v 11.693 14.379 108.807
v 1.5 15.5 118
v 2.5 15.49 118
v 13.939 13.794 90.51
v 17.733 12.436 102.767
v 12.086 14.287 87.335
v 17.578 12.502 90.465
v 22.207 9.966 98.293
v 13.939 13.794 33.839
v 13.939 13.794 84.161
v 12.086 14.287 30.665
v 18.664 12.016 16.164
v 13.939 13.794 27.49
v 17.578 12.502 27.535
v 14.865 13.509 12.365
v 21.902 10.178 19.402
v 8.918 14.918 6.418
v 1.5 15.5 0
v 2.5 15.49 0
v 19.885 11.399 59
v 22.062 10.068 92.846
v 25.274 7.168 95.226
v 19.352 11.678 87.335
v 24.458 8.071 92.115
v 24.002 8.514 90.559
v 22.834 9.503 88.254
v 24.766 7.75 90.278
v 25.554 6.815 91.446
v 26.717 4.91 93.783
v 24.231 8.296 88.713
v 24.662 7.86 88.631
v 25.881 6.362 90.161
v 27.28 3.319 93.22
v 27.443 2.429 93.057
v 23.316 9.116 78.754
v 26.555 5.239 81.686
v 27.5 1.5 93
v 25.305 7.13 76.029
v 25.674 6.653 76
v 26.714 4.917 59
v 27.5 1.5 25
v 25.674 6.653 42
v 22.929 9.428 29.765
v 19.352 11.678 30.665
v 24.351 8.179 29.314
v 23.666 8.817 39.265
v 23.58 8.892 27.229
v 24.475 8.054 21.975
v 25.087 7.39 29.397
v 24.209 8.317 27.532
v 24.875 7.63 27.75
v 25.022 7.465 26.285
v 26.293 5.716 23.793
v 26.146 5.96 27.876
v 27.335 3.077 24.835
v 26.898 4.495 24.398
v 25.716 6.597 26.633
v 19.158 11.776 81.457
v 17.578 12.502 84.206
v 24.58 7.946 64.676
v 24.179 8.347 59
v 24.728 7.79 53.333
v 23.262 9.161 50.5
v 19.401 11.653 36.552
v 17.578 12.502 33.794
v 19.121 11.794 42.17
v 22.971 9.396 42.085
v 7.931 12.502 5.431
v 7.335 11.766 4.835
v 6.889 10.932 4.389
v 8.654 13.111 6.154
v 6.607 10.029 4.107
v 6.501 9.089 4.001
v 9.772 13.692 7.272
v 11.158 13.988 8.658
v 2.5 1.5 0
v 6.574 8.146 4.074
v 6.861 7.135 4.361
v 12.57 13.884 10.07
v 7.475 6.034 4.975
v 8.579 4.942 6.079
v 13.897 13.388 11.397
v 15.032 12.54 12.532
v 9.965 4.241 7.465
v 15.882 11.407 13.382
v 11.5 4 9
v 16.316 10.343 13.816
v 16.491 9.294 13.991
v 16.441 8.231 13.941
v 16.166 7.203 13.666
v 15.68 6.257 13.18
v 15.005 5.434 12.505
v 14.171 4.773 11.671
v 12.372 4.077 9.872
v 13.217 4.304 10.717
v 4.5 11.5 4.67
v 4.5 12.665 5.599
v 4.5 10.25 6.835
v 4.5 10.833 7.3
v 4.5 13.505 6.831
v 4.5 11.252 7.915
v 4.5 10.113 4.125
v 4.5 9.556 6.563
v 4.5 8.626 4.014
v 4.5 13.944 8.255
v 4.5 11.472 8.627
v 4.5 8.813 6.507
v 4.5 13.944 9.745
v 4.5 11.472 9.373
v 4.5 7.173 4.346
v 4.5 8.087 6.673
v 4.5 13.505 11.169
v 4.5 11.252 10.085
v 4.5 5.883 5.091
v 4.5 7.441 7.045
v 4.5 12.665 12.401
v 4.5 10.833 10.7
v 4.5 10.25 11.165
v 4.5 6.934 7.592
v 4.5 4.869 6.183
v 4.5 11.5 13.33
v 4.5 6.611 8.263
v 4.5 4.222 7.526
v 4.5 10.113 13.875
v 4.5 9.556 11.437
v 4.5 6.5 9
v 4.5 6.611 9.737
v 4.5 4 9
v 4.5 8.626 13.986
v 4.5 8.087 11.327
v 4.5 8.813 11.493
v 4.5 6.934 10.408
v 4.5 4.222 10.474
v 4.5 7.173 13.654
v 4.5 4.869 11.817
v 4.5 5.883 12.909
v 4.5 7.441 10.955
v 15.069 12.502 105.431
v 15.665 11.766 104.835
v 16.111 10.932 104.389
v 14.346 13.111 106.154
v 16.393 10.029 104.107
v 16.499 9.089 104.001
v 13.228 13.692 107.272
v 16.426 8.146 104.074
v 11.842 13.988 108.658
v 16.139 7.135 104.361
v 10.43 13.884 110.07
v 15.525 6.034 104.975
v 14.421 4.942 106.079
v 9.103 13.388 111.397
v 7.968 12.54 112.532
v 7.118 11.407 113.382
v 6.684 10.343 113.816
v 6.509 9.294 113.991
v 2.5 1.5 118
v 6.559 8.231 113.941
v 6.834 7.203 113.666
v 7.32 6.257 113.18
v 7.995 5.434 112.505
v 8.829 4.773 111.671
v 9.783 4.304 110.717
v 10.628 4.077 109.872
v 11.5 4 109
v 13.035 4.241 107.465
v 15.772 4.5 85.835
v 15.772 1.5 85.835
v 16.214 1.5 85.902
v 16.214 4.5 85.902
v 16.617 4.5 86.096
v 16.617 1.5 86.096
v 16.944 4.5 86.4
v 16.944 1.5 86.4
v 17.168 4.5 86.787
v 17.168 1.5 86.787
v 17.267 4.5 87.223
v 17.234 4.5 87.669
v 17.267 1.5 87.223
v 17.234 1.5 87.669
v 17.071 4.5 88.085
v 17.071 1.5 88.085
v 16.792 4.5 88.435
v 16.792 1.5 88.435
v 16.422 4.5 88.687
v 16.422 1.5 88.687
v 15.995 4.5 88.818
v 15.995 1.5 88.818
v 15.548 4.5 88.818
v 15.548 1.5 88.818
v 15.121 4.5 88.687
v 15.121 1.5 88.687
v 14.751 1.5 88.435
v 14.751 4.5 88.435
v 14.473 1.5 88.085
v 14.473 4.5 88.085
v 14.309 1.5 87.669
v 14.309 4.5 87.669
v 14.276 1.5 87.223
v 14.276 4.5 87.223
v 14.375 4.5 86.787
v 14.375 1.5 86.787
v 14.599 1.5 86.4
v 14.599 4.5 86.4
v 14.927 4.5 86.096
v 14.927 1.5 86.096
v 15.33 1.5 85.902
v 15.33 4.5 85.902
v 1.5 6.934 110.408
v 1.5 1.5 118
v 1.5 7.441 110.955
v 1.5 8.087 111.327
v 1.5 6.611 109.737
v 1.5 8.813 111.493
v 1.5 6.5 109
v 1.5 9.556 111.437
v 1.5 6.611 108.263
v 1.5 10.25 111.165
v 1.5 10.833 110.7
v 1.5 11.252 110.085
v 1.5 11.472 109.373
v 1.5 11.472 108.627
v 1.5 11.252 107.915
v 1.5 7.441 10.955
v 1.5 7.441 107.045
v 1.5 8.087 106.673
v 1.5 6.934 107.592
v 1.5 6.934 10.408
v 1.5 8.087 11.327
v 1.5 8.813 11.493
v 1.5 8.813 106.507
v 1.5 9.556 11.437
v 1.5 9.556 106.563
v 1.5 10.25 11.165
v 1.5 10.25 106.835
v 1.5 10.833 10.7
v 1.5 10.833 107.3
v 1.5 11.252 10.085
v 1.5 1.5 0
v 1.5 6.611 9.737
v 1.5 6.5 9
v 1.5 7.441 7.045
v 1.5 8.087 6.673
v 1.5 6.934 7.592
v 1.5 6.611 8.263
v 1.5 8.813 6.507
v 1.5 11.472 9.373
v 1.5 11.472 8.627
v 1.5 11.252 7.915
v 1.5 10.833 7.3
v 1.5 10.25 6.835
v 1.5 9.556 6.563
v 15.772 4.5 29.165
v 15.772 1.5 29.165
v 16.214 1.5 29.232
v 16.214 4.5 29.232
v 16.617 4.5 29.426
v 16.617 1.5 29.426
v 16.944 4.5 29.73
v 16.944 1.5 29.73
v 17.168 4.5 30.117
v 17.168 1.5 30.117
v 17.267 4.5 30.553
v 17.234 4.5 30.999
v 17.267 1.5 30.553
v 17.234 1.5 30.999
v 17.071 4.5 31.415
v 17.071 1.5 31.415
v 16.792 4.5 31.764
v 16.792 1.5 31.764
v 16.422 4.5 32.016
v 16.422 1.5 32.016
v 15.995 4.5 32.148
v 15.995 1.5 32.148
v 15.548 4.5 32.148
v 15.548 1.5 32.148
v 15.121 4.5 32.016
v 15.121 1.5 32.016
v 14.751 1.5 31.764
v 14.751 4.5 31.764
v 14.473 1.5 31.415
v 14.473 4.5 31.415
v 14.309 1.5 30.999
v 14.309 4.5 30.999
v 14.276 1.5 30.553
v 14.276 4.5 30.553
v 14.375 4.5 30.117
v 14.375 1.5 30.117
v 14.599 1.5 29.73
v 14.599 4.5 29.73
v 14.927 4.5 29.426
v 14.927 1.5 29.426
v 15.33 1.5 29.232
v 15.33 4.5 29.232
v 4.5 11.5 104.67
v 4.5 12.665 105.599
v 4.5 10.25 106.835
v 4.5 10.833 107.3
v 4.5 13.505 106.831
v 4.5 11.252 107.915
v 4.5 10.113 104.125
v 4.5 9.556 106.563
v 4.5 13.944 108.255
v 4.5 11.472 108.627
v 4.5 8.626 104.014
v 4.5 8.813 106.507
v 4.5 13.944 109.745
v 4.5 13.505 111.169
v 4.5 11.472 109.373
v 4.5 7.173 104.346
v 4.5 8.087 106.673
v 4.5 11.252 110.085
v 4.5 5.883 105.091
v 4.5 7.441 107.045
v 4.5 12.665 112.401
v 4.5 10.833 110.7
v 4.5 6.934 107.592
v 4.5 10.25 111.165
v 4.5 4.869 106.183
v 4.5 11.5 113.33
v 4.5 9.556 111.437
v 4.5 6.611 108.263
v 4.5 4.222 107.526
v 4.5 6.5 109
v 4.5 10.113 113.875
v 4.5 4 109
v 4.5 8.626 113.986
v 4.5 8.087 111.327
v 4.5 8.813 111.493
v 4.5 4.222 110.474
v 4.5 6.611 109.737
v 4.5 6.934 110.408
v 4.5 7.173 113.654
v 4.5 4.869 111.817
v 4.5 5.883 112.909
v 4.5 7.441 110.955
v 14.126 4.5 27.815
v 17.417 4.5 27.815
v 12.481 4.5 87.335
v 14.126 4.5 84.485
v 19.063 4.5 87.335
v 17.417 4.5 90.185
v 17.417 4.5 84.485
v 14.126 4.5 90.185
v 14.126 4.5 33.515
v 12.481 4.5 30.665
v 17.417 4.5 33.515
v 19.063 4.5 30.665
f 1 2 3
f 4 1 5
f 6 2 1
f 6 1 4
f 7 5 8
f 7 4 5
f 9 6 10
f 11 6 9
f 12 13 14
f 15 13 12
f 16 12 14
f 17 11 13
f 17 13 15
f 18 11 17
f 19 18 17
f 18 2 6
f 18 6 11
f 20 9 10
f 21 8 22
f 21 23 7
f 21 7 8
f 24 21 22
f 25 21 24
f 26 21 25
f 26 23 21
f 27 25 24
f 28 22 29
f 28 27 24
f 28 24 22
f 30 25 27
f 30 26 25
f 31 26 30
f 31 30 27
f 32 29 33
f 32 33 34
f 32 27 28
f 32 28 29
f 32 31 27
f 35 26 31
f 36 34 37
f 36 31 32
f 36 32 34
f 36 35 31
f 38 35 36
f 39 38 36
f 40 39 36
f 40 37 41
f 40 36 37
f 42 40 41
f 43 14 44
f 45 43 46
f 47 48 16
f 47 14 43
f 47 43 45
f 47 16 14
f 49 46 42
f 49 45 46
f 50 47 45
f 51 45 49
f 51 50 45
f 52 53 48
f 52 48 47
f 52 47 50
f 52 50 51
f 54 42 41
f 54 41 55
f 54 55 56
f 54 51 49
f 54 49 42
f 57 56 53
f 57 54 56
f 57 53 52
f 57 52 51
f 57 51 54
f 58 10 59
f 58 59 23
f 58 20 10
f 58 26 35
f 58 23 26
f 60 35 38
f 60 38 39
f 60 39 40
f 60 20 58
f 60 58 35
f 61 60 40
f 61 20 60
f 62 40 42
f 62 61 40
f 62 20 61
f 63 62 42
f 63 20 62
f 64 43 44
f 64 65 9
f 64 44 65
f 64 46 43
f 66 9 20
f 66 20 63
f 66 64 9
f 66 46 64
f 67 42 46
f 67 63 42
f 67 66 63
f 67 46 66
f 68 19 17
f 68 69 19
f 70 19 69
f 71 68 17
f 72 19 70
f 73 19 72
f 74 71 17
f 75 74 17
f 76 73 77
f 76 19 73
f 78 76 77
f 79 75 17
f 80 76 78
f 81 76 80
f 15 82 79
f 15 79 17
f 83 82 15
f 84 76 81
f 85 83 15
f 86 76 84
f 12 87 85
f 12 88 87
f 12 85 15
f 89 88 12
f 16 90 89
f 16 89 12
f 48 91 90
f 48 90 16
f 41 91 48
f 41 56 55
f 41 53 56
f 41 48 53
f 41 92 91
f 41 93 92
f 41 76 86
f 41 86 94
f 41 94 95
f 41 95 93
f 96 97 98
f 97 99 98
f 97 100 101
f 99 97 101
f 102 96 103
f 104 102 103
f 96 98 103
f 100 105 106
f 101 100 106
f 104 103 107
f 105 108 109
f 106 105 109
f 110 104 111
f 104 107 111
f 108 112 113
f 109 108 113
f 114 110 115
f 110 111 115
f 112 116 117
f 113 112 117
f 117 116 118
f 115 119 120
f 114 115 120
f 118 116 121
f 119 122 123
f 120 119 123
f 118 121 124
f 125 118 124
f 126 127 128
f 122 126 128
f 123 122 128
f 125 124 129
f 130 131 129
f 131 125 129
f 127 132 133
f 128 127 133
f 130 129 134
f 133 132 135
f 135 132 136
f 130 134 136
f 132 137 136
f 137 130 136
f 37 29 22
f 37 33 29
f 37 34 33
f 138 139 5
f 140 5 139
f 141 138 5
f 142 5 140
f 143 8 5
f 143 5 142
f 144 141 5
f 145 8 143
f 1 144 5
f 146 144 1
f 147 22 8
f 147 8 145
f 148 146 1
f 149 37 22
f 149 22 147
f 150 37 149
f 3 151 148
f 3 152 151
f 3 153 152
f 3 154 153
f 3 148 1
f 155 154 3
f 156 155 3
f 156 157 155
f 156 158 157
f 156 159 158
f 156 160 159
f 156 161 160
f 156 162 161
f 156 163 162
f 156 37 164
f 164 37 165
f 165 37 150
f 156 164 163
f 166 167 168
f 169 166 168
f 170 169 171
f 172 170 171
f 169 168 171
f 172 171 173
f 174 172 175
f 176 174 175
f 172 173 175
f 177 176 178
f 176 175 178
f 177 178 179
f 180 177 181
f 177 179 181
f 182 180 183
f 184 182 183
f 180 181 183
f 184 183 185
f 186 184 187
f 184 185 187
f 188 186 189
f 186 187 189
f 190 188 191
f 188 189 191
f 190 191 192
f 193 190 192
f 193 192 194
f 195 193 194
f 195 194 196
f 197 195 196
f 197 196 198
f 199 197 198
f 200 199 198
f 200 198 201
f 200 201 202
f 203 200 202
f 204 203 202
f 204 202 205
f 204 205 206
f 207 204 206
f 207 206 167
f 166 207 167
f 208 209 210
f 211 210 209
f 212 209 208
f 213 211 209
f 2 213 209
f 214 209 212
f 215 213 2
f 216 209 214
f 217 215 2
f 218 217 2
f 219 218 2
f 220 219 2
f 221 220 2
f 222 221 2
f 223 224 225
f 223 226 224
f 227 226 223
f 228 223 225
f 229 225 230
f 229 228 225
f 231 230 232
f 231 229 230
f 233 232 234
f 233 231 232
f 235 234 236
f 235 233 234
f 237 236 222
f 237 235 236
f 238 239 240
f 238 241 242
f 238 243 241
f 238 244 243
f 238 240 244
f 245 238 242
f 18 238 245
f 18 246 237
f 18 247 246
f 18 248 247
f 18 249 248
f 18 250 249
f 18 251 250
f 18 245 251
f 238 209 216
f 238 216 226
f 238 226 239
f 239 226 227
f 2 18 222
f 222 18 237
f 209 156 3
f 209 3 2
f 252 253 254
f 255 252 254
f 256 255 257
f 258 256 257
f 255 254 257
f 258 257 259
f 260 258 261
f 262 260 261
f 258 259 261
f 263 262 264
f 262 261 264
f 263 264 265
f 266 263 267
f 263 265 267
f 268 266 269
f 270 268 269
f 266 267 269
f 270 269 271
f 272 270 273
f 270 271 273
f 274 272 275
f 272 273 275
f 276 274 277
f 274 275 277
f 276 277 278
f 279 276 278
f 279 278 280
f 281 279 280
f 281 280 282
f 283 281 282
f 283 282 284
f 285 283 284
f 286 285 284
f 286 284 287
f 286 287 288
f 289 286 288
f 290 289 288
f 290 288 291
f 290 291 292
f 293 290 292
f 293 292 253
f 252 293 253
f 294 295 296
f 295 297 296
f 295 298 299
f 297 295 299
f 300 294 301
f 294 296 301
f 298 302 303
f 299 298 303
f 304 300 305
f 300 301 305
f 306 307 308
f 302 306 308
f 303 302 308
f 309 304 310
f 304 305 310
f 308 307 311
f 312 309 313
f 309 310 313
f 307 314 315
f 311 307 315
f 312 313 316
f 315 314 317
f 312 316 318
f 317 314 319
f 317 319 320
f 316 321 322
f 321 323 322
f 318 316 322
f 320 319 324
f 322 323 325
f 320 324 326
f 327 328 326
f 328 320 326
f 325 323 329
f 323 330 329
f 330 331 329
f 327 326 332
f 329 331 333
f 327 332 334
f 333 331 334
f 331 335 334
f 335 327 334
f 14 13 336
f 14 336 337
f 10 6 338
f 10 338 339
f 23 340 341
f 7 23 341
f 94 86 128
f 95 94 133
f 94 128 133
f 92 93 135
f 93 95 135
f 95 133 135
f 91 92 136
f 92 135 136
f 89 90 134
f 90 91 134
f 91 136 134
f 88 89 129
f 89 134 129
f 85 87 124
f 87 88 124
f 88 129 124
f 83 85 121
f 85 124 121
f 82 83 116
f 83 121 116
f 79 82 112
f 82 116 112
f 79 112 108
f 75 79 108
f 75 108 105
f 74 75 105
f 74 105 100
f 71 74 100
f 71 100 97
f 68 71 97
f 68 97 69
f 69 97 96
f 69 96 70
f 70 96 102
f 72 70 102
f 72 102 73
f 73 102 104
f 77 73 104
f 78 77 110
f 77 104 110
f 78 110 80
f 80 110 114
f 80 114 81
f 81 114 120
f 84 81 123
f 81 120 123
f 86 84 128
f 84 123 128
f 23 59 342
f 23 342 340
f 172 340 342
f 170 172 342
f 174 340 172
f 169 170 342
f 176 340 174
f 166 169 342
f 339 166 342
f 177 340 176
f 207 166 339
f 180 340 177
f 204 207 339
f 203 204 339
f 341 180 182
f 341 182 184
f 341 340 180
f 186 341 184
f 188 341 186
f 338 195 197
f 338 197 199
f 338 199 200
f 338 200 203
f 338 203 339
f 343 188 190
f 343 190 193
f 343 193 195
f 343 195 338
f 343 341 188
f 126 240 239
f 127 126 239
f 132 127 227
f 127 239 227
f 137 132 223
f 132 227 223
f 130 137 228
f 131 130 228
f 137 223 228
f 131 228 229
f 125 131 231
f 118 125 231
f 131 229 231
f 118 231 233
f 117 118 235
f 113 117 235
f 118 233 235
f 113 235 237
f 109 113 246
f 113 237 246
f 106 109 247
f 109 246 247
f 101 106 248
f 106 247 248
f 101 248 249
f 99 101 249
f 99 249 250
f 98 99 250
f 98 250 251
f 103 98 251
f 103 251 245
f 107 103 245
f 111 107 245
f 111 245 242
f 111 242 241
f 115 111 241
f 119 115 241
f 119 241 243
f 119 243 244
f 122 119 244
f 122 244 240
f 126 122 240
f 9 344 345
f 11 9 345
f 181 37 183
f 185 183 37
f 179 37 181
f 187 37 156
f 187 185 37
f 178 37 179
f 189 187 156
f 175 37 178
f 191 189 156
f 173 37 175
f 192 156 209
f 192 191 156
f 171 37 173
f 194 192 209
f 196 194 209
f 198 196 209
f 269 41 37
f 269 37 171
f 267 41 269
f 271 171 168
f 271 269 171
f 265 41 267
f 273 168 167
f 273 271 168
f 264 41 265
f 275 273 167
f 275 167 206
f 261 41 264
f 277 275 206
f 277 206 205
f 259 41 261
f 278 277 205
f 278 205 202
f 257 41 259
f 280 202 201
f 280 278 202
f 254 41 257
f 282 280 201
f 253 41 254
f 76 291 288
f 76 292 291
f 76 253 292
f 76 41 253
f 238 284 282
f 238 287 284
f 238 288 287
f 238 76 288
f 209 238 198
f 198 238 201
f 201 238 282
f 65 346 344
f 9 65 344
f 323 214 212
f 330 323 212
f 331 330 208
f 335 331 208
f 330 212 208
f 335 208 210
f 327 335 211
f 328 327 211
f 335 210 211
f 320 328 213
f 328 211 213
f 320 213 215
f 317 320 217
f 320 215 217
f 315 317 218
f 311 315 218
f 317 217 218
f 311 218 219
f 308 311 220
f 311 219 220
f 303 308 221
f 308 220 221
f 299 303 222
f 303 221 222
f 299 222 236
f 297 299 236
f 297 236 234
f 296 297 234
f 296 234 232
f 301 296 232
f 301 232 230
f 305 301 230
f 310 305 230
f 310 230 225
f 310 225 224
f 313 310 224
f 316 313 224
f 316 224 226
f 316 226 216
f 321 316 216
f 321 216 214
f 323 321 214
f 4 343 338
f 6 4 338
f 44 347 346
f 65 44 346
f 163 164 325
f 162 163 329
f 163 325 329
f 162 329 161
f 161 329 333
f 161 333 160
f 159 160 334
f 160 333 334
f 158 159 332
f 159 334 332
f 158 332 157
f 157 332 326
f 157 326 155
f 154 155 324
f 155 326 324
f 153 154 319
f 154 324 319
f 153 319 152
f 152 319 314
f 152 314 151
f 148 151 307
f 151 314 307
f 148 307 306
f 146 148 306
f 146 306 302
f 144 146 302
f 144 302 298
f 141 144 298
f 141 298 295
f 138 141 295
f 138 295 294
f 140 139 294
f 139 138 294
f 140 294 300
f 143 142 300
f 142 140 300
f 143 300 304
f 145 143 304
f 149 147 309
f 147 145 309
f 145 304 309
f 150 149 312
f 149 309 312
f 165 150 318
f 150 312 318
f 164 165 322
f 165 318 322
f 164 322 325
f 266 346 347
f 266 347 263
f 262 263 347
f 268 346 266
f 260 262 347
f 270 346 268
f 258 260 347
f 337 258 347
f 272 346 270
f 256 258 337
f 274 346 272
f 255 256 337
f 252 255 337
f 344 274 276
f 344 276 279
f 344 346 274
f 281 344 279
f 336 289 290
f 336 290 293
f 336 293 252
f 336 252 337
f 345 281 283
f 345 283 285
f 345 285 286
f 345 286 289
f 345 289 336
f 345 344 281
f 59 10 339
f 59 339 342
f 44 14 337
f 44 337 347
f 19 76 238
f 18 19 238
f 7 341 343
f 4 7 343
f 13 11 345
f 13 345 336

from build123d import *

# Parameters (mm, degrees)
EXTRU_MINCE1_DEPTH      = 118
ESQUISSE2_R             = 2.5
ENL_V_MAT_EXTRU_1_DEPTH = 4
ESQUISSE3_R             = 1.5
ENL_V_MAT_EXTRU_2_DEPTH = 4
CHANFREIN1_SIZE         = 25
BOSS_EXTRU_1_DEPTH      = 118
ESQUISSE5_R             = 2.5
ENL_V_MAT_EXTRU_3_DEPTH = 122.820564897
ESQUISSE6_R             = 1.5
ENL_V_MAT_EXTRU_4_DEPTH = 123.149498698
ENL_V_START             = -3
ESQUISSE8_R             = 5
ENL_V_MAT_EXTRU_5_DEPTH = 119.820564897
ENL_V_MAT_EXTRU_6_DEPTH = 119.9682337
ENL_V_MAT_EXTRU_6_TAPER = -2


with BuildPart() as part:
    # Esquisse1 → Extru.-Mince1 (new body)
    with BuildSketch(Plane.XY):
        Polygon((0, 15.5), (0, 0), (27.5, 0), (27.5, 1.5), (1.5, 1.5), (1.5, 15.5), align=None)
    extrude(amount=EXTRU_MINCE1_DEPTH)

    # Esquisse2 → Enlèv. mat.-Extru.1 (cut)
    with BuildSketch(Plane.ZY):
        with Locations(Location((9, 9, 0), (0, 0, 270))):
            Circle(ESQUISSE2_R)
        with Locations(Location((109, 9, 0), (0, 0, 90))):
            Circle(ESQUISSE2_R)
    extrude(amount=-ENL_V_MAT_EXTRU_1_DEPTH, mode=Mode.SUBTRACT)

    # Esquisse3 → Enlèv. mat.-Extru.2 (cut)
    with BuildSketch(Plane.XZ):
        with Locations(Location((15.771636742, 30.664864187, 0), (0, 0, 270))):
            Circle(ESQUISSE3_R)
        with Locations(Location((15.771636742, 87.335135813, 0), (0, 0, 90))):
            Circle(ESQUISSE3_R)
    extrude(amount=-ENL_V_MAT_EXTRU_2_DEPTH, mode=Mode.SUBTRACT)

    # Chanfrein1
    chanfrein1_edges = [part.edges().sort_by_distance(p)[0] for p in [
        (27.5, 0.75, 0),
        (27.5, 0.75, 118),
    ]]
    chamfer(chanfrein1_edges, length=CHANFREIN1_SIZE)


with BuildPart() as body_2:
    # Esquisse4 → Boss.-Extru.1 (new body)
    with BuildSketch(Plane(origin=(0, 0, 0), x_dir=(-1, 0, 0), z_dir=(0, 0, -1))):
        with BuildLine():
            Line((-27.5, 1.5), (-1.5, 1.5))
            Line((-1.5, 1.5), (-1.5, 15.5))
            add(Edge.make_bspline(
                [(-1.5, 15.5), (-27.5, 15.5), (-27.5, 1.5)],
                knots=[4.71238898, 4.71238898, 4.71238898, 6.283185307, 6.283185307, 6.283185307], degree=2, weights=[1, 0.707106781, 1]))
        make_face()
    extrude(amount=-BOSS_EXTRU_1_DEPTH)

    # Esquisse5 → Enlèv. mat.-Extru.3 (cut, through all)
    with BuildSketch(Plane.ZY.offset(-1.5)):
        with Locations(Location((109, 9, 0), (0, 0, 270))):
            Circle(ESQUISSE5_R)
        with Locations(Location((9, 9, 0), (0, 0, 270))):
            Circle(ESQUISSE5_R)
    extrude(amount=-ENL_V_MAT_EXTRU_3_DEPTH, mode=Mode.SUBTRACT)

    # Esquisse6 → Enlèv. mat.-Extru.4 (cut, through all)
    with BuildSketch(Plane.XZ):
        with Locations(Location((15.771636742, 87.335135813, 0), (0, 0, 270))):
            Circle(ESQUISSE6_R)
        with Locations(Location((15.771636742, 30.664864187, 0), (0, 0, 270))):
            Circle(ESQUISSE6_R)
        Polygon((27.5, 93), (2.5, 118), (27.5, 118), align=None)
        Polygon((2.5, 0), (27.5, 25), (27.5, 0), align=None)
    extrude(amount=-ENL_V_MAT_EXTRU_4_DEPTH, mode=Mode.SUBTRACT)

    # Esquisse8 → Enlèv. mat.-Extru.5 (cut, through all)
    with BuildSketch(Plane.ZY.offset(-1.5).offset(ENL_V_START)):
        with Locations(Location((9, 9, 0), (0, 0, 270))):
            Circle(ESQUISSE8_R)
        with Locations(Location((109, 9, 0), (0, 0, 270))):
            Circle(ESQUISSE8_R)
    extrude(amount=-ENL_V_MAT_EXTRU_5_DEPTH, mode=Mode.SUBTRACT)

    # Esquisse9 → Enlèv. mat.-Extru.6 (cut, through all)
    with BuildSketch(Plane.XZ.offset(-1.5).offset(ENL_V_START)):
        Polygon((19.062533276, 87.335135813), (17.417085009, 90.185135813), (14.126188475, 90.185135813), (12.480740208, 87.335135813), (14.126188475, 84.485135813), (17.417085009, 84.485135813), align=None)
        Polygon((17.417085009, 33.514864187), (14.126188475, 33.514864187), (12.480740208, 30.664864187), (14.126188475, 27.814864187), (17.417085009, 27.814864187), (19.062533276, 30.664864187), align=None)
    extrude(amount=-ENL_V_MAT_EXTRU_6_DEPTH, taper=ENL_V_MAT_EXTRU_6_TAPER, mode=Mode.SUBTRACT)


solid = body_2.part
